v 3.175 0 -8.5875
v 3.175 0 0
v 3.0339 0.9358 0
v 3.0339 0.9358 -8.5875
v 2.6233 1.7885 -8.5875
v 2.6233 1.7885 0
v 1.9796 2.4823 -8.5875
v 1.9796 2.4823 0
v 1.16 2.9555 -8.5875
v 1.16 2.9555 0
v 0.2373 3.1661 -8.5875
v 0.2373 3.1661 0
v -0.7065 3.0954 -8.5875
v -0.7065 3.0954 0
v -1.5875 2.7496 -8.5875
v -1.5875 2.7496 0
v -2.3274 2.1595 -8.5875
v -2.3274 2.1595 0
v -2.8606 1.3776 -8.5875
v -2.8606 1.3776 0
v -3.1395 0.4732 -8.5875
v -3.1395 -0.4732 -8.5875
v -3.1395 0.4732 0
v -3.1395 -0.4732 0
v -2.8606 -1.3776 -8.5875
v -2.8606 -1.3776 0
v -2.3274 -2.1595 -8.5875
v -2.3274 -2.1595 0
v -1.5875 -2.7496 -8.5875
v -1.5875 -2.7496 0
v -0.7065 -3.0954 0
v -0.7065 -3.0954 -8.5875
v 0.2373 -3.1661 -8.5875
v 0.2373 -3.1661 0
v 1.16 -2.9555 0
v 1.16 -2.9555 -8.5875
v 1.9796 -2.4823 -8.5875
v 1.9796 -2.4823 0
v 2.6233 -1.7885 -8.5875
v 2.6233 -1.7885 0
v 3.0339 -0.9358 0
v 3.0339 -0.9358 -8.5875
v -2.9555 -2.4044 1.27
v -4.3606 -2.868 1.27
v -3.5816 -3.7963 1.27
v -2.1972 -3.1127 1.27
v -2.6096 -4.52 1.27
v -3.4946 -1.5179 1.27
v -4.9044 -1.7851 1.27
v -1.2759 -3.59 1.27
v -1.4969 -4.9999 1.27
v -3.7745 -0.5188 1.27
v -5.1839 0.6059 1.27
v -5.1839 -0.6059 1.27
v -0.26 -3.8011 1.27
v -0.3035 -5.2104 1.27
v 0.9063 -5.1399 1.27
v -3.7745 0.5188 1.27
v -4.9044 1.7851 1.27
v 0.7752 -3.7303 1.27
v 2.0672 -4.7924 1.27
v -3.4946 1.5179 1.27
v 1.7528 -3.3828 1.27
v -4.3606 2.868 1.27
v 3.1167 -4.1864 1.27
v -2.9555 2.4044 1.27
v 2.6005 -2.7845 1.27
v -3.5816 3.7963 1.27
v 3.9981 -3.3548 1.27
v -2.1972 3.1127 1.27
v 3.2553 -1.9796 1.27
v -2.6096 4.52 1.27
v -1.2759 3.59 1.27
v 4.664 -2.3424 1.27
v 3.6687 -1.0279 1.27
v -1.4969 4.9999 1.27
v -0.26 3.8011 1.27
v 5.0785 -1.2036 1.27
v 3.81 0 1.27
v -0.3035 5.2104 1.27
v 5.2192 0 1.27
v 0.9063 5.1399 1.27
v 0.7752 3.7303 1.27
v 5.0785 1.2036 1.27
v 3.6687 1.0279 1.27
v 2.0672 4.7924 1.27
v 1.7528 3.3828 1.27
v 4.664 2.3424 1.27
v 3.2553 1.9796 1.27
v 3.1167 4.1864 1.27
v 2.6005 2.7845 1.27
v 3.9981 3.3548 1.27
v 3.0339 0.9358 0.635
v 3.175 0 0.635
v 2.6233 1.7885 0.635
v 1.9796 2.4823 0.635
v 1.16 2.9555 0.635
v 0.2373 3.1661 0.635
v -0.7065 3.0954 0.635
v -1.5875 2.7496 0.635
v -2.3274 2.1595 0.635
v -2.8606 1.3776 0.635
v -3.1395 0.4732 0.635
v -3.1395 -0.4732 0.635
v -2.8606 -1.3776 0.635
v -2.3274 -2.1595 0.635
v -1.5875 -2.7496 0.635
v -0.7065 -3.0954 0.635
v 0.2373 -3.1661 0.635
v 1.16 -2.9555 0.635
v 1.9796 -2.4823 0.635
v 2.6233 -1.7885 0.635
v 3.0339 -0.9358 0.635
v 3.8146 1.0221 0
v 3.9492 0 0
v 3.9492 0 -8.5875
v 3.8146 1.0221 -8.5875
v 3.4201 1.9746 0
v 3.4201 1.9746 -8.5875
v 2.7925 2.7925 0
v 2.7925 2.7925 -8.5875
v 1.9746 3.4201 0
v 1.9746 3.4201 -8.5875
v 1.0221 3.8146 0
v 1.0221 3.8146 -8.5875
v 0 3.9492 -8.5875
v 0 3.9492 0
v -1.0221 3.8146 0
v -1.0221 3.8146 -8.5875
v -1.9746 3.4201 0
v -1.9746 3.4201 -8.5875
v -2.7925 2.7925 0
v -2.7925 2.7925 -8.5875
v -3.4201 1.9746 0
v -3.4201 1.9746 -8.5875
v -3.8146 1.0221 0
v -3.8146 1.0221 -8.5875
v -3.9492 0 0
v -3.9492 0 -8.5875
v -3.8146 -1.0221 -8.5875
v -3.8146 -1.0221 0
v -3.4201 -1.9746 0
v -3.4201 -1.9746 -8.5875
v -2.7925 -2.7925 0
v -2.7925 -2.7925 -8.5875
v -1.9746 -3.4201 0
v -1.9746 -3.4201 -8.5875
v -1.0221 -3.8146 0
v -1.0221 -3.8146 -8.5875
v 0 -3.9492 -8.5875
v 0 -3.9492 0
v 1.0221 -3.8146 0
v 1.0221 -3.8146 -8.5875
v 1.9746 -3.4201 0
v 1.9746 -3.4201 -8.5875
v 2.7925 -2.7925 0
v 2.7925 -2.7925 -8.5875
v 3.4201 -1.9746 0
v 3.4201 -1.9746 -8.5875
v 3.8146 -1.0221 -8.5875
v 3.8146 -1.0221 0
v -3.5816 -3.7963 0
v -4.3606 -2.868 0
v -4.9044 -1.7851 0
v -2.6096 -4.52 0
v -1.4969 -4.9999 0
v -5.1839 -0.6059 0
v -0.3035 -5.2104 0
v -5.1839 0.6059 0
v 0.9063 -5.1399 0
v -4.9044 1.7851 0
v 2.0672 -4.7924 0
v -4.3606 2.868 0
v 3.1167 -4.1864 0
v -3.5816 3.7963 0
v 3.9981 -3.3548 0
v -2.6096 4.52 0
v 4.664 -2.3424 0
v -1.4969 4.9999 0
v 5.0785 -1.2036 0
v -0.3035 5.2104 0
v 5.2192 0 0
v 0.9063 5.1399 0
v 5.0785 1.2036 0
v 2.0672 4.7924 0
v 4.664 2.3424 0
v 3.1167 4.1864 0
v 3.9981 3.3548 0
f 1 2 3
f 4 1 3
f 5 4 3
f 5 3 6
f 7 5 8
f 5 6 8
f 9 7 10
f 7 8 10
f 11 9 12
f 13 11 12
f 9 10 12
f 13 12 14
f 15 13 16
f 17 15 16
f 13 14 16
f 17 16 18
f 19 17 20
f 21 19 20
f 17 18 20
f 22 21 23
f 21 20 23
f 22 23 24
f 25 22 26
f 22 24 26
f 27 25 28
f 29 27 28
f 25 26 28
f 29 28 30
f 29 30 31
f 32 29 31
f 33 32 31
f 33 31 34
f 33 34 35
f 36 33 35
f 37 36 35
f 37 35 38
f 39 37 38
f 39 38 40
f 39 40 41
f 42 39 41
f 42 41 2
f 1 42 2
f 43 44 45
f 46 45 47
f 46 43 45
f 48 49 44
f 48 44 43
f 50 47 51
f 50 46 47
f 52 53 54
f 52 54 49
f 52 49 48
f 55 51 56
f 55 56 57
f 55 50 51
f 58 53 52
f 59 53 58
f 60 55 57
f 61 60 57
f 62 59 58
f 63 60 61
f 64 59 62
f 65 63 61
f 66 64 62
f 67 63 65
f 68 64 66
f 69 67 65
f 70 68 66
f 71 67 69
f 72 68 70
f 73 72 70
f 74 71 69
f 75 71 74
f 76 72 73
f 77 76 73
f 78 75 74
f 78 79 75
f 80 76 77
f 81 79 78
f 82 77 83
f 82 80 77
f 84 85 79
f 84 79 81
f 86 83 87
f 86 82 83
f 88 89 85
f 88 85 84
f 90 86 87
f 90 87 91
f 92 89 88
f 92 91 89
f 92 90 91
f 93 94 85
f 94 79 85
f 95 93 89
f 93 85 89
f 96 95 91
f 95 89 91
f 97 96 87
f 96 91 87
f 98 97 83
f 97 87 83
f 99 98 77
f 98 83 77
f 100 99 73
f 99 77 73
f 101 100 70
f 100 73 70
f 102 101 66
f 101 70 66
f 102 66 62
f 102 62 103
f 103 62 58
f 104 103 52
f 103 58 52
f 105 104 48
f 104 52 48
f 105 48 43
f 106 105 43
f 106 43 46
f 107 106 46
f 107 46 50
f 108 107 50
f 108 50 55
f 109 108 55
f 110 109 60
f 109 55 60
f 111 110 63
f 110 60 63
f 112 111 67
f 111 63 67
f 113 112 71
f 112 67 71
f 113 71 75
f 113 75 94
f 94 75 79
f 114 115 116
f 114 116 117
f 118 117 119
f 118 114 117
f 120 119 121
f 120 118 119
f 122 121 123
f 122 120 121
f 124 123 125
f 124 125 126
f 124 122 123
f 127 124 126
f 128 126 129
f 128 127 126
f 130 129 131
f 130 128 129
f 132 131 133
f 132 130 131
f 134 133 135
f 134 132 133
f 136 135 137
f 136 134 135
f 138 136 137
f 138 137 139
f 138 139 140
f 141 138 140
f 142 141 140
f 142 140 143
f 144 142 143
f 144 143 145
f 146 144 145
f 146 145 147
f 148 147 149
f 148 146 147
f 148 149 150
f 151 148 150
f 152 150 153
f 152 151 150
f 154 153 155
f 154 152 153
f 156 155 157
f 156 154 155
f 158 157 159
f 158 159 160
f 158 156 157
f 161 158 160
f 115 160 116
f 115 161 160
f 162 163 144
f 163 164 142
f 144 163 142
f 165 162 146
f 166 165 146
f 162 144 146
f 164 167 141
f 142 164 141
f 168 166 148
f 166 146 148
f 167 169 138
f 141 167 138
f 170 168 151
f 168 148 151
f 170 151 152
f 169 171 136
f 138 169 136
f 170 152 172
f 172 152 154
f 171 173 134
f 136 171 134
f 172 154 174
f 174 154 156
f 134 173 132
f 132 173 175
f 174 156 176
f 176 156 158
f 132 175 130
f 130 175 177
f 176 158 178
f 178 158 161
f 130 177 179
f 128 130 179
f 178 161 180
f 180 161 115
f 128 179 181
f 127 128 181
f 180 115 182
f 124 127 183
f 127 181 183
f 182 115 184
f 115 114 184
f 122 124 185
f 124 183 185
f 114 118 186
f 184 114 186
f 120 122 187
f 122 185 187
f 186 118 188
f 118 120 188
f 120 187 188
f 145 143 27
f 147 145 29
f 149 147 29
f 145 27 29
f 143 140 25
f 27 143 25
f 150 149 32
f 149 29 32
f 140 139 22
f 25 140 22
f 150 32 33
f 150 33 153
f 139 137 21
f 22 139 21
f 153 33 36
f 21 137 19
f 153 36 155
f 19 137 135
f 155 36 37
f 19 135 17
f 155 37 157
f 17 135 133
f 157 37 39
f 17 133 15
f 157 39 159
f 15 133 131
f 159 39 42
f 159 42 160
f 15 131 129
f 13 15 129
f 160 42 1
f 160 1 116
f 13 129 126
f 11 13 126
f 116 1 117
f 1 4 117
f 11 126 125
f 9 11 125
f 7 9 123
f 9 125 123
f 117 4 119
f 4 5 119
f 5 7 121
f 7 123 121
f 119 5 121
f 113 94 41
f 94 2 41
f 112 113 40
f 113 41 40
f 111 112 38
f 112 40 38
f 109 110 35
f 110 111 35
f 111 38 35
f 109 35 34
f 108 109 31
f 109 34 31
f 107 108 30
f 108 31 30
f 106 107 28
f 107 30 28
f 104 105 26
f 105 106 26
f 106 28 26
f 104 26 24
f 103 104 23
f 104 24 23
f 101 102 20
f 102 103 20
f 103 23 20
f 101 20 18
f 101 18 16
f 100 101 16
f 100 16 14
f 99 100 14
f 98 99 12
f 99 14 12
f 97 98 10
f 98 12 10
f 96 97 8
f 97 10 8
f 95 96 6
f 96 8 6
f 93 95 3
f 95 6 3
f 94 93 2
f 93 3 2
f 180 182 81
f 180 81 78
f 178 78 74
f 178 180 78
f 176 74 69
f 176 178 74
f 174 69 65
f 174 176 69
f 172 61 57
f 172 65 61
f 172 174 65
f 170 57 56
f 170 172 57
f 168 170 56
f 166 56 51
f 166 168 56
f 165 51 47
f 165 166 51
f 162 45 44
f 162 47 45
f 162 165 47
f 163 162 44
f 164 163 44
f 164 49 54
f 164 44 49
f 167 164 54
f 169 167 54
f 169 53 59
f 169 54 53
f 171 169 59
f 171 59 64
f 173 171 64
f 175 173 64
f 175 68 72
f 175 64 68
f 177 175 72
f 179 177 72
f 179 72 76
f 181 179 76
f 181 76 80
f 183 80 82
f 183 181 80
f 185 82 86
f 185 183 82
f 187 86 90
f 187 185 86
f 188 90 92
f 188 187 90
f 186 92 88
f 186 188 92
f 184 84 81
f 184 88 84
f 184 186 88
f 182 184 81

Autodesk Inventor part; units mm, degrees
ref_plane "YZ Plane" through (0, 0, 0) normal (1, 0, 0) x (0, 1, 0)
ref_plane "XZ Plane" through (0, 0, 0) normal (0, 1, 0) x (-1, 0, 0)
ref_plane "XY Plane" through (0, 0, 0) normal (0, 0, 1) x (1, 0, 0)
sketch "Sketch1" plane through (0, 0, 0) normal (0, 0, 1) x (1, 0, 0)
  circle A0 centre (0, 0) radius 4 projected
  circle A1 centre (0, 0) radius 3.9492
  circle A2 centre (0, 0) radius 5.2192
  circle A3 centre (0, 0) radius 3.175
  point P0 (0, 0)
  dimension "d0" = 0.0508
  dimension "d1" = 1.27
  dimension "d2" = 6.35
extrude "Extrusion1" add sketch "Sketch1" along normal blind 1.27 contours A0 | A1 | A2
extrude "Extrusion2" add sketch "Sketch1" against normal blind 8.5875 contours A1
chamfer "Chamfer1" distance 0.635 angle 45 1 edges at (-3.175, 0, 1.27)
properties part number "AxleAdapter"
